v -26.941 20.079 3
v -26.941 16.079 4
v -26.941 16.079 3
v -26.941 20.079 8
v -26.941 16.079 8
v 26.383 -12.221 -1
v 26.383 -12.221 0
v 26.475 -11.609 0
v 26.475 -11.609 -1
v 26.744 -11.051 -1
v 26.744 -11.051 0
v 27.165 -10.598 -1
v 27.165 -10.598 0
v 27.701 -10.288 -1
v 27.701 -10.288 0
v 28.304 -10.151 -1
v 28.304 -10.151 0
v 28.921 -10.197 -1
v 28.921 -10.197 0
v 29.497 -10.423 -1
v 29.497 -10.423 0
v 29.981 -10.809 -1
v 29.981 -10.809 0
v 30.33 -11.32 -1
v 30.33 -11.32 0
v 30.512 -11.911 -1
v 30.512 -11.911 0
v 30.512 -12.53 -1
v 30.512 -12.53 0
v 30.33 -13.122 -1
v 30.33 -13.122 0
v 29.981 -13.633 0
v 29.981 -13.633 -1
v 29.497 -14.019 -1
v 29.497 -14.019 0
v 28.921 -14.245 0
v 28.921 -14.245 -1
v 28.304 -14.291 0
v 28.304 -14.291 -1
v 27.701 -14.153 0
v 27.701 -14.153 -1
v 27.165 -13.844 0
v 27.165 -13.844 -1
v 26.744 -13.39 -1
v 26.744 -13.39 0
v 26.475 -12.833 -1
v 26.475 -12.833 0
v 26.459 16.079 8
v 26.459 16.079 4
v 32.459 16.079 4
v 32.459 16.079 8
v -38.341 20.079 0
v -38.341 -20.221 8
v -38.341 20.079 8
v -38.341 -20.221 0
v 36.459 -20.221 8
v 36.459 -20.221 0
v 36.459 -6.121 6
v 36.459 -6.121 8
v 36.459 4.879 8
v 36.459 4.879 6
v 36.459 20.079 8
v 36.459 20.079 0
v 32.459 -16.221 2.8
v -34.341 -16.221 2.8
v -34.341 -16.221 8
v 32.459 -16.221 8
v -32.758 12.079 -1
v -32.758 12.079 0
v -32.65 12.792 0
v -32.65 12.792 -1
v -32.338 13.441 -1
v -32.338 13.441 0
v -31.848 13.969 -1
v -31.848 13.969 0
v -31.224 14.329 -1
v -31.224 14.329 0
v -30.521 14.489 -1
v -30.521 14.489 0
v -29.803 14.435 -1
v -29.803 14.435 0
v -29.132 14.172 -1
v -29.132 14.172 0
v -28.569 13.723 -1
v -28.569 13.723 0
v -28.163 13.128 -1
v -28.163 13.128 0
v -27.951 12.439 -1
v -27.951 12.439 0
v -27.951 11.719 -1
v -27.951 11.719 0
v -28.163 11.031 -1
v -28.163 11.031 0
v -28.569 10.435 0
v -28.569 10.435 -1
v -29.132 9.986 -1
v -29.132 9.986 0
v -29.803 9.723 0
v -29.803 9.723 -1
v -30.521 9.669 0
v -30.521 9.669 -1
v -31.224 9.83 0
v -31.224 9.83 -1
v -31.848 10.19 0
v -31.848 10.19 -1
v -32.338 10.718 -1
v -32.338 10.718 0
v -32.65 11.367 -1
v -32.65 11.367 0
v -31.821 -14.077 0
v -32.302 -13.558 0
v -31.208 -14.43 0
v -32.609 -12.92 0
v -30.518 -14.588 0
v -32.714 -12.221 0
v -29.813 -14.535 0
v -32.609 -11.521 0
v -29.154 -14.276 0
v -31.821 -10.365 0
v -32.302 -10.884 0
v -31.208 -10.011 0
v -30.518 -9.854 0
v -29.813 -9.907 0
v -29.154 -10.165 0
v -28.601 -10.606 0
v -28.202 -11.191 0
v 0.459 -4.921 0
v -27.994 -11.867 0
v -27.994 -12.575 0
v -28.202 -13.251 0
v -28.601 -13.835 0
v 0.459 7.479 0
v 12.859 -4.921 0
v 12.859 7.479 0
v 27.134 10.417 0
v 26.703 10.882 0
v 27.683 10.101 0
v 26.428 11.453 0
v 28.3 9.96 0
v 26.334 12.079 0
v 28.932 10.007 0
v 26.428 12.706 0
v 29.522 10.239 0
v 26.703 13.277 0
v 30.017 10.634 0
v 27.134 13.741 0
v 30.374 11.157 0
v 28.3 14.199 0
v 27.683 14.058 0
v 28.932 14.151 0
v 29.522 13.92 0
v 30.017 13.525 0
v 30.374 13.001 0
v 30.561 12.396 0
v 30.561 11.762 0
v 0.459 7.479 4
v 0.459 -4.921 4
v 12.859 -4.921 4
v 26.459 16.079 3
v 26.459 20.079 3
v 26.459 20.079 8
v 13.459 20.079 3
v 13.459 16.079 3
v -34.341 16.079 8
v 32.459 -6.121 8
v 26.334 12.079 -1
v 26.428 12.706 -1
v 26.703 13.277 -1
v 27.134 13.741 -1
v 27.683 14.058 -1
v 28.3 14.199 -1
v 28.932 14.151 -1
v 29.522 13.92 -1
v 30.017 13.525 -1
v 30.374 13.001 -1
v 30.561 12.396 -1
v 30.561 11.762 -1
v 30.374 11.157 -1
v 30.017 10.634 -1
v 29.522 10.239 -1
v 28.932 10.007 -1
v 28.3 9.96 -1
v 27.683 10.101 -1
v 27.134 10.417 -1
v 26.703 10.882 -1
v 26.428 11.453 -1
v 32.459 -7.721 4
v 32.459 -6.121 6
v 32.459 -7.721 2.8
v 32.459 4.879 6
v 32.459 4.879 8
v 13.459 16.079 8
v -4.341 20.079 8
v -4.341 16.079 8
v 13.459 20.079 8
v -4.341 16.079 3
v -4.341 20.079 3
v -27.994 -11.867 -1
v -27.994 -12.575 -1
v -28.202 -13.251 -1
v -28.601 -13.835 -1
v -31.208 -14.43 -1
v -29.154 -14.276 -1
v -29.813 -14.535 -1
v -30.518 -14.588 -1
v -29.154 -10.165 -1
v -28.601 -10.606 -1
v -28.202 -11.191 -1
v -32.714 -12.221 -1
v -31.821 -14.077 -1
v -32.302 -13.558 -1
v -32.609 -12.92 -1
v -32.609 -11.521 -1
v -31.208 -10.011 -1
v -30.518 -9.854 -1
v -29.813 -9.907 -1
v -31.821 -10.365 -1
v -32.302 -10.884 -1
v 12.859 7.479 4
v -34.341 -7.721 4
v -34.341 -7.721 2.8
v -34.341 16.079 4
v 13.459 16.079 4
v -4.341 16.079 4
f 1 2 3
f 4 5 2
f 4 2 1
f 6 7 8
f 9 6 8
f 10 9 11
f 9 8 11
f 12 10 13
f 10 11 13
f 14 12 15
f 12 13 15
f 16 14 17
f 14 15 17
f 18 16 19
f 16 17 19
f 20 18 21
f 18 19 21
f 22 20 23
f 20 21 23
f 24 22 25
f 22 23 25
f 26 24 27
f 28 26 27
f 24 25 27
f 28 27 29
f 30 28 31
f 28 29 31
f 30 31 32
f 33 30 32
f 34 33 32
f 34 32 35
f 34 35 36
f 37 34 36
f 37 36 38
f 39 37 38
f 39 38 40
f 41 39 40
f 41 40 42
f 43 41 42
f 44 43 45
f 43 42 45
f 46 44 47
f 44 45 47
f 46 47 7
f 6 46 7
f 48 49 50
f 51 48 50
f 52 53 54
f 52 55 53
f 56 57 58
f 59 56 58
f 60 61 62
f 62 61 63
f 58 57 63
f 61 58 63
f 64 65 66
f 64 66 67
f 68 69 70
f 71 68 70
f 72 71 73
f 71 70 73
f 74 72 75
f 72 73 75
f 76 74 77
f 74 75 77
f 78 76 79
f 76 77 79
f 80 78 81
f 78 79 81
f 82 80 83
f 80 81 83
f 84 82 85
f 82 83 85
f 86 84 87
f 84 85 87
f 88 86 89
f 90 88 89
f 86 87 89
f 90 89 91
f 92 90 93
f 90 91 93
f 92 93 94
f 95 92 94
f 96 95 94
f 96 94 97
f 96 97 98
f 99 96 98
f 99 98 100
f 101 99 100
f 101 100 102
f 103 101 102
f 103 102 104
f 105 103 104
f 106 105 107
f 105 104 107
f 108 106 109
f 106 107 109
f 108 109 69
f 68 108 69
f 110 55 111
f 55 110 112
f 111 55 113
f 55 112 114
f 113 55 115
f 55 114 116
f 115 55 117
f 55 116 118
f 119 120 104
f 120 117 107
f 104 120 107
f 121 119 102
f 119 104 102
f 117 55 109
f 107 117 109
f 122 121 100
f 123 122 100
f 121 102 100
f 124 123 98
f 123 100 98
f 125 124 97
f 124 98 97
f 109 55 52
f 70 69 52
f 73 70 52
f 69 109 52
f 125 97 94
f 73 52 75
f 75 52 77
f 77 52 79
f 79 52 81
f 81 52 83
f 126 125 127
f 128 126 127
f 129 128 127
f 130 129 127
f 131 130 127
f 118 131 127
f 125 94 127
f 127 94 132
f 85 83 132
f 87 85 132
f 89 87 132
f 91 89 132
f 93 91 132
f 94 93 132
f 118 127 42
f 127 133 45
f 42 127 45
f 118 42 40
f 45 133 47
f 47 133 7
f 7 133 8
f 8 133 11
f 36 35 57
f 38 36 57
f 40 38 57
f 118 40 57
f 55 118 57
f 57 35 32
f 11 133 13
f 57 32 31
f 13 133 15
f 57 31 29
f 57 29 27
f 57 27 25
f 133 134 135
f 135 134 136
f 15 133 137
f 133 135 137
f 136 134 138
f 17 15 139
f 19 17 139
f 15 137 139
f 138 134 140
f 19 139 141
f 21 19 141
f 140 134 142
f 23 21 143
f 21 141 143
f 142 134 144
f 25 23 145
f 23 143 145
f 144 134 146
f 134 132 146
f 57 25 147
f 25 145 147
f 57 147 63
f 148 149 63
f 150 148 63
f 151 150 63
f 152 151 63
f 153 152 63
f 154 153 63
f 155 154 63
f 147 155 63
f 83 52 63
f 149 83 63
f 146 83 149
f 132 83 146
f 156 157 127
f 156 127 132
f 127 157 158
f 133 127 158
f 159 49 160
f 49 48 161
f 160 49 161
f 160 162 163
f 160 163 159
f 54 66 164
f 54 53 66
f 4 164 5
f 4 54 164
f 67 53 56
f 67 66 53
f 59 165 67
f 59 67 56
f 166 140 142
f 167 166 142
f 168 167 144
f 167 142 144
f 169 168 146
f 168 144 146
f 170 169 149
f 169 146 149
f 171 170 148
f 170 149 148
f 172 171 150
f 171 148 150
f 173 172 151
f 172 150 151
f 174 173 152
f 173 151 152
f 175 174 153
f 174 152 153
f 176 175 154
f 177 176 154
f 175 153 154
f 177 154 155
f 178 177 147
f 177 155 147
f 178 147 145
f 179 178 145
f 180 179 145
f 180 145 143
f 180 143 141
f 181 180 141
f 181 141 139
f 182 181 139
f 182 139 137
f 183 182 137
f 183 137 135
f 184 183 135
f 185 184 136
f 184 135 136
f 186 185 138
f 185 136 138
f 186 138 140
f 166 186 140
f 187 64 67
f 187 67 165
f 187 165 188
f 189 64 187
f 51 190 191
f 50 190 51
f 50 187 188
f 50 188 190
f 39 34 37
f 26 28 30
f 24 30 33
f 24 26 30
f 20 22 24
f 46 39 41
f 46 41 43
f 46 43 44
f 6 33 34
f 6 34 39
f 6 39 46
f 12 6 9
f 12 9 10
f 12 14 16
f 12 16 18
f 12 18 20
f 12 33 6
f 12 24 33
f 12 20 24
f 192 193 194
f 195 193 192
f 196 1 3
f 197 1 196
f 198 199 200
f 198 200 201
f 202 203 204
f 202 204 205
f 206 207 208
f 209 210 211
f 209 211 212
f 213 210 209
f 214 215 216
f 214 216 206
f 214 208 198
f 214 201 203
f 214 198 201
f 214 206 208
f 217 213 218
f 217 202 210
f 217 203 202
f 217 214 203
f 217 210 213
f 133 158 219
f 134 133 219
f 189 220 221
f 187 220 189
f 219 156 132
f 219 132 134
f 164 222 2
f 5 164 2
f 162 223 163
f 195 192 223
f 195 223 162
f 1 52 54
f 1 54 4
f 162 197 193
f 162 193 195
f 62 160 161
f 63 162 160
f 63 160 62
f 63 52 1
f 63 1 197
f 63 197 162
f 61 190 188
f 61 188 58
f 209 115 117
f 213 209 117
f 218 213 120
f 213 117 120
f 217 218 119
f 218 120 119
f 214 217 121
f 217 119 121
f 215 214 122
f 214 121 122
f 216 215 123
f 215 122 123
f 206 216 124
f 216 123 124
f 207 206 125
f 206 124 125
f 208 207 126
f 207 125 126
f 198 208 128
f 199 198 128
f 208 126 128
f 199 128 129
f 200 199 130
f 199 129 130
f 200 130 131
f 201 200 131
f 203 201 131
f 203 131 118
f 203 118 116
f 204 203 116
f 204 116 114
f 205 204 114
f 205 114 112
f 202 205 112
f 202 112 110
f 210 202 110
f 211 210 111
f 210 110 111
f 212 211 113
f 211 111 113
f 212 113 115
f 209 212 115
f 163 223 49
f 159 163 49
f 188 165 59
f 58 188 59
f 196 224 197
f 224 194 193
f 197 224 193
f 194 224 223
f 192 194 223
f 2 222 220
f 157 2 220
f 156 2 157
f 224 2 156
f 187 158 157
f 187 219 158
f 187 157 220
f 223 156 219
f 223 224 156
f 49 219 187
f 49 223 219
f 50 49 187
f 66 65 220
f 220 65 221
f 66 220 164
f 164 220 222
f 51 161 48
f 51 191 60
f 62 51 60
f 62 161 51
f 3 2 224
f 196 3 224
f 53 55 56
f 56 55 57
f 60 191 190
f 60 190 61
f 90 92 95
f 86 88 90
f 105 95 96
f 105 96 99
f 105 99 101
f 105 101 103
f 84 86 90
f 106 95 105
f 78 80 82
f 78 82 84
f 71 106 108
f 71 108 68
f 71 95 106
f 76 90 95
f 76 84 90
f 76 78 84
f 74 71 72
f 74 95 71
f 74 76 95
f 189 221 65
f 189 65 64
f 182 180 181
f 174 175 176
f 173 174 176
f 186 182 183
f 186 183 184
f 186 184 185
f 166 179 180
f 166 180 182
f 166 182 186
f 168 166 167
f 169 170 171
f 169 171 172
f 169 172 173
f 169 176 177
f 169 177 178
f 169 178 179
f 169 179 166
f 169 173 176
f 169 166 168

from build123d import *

# Parameters (mm, degrees)
SKETCH_1_W          = 74.8
SKETCH_1_H          = 40.3
EXTRUDE_1_DEPTH     = 4
SKETCH_2_W          = 74.8
SKETCH_2_H          = 40.3
SKETCH_2_W_2        = 66.8
SKETCH_2_H_2        = 32.3
EXTRUDE_1_2_DEPTH   = 4
SKETCH_3_R          = 2.125481821
SKETCH_3_R_2        = 2.41676927
SKETCH_3_R_3        = 2.07603791
SKETCH_3_R_4        = 2.373619113
EXTRUDE_2_DEPTH     = 1
SKETCH_4_W          = 4
SKETCH_4_H          = 11
CUT_EXTRUDE_1_DEPTH = 2
SKETCH_6_W          = 66.8
SKETCH_6_H          = 8.5
CUT_EXTRUDE_3_DEPTH = 1.2
SKETCH_7_W          = 13
SKETCH_7_H          = 4
SKETCH_7_W_2        = 22.6
CUT_EXTRUDE_4_DEPTH = 5
CUT_EXTRUDE_5_REACH = 7
SKETCH_9_W          = 12.4
SKETCH_9_H          = 12.4


with BuildPart() as part:
    # 草圖1 → Extrude 1 (new body)
    with BuildSketch(Plane.XY):
        with Locations((-0.94084879, -0.070758559)):
            Rectangle(SKETCH_1_W, SKETCH_1_H)
    extrude(amount=EXTRUDE_1_DEPTH)

    # 草圖2 → Extrude 1 2 (add)
    with BuildSketch(Plane.XY.offset(4)):
        with Locations((-0.94084879, -0.070758559)):
            Rectangle(SKETCH_2_W, SKETCH_2_H)
        with Locations((-0.94084879, -0.070758559)):
            Rectangle(SKETCH_2_W_2, SKETCH_2_H_2, mode=Mode.SUBTRACT)
    extrude(amount=EXTRUDE_1_2_DEPTH)

    # 草圖3 → 填料-伸長2 (add)
    with BuildSketch(Plane(origin=(0, 0, 0), x_dir=(-1, 0, 0), z_dir=(0, 0, -1))):
        with Locations((-28.45915121, 12.079241441)):
            Circle(SKETCH_3_R)
        with Locations((30.34084879, 12.079241441)):
            Circle(SKETCH_3_R_2)
        with Locations((-28.45915121, -12.220758559)):
            Circle(SKETCH_3_R_3)
        with Locations((30.34084879, -12.220758559)):
            Circle(SKETCH_3_R_4)
    extrude(amount=EXTRUDE_2_DEPTH)

    # 草圖4 → 除料-伸長1 (cut)
    with BuildSketch(Plane.XY.offset(8)):
        with Locations((34.45915121, -0.620758559)):
            Rectangle(SKETCH_4_W, SKETCH_4_H)
    extrude(amount=-CUT_EXTRUDE_1_DEPTH, mode=Mode.SUBTRACT)

    # 草圖6 → 除料-伸長3 (cut)
    with BuildSketch(Plane.XY.offset(4)):
        with Locations((-0.94084879, -11.970758559)):
            Rectangle(SKETCH_6_W, SKETCH_6_H)
    extrude(amount=-CUT_EXTRUDE_3_DEPTH, mode=Mode.SUBTRACT)

    # 草圖7 → 除料-伸長4 (cut)
    with BuildSketch(Plane.XY.offset(8)):
        with Locations((19.95915121, 18.079241441)):
            Rectangle(SKETCH_7_W, SKETCH_7_H)
        with Locations((-15.64084879, 18.079241441)):
            Rectangle(SKETCH_7_W_2, SKETCH_7_H)
    extrude(amount=-CUT_EXTRUDE_4_DEPTH, mode=Mode.SUBTRACT)

    # 草圖9 → 除料-伸長5 (cut, up to next)
    with BuildSketch(Plane.XY.offset(4), mode=Mode.PRIVATE) as cut_extrude_5_sk1:
        with Locations((6.65915121, 1.279241441)):
            Rectangle(SKETCH_9_W, SKETCH_9_H)
    cut_extrude_5_tool1 = extrude(cut_extrude_5_sk1.sketch, amount=-CUT_EXTRUDE_5_REACH, mode=Mode.PRIVATE) & part.part
    add(cut_extrude_5_tool1.solids().sort_by_distance((6.659151, 1.279241, 4))[0], mode=Mode.SUBTRACT)


solid = part.part
